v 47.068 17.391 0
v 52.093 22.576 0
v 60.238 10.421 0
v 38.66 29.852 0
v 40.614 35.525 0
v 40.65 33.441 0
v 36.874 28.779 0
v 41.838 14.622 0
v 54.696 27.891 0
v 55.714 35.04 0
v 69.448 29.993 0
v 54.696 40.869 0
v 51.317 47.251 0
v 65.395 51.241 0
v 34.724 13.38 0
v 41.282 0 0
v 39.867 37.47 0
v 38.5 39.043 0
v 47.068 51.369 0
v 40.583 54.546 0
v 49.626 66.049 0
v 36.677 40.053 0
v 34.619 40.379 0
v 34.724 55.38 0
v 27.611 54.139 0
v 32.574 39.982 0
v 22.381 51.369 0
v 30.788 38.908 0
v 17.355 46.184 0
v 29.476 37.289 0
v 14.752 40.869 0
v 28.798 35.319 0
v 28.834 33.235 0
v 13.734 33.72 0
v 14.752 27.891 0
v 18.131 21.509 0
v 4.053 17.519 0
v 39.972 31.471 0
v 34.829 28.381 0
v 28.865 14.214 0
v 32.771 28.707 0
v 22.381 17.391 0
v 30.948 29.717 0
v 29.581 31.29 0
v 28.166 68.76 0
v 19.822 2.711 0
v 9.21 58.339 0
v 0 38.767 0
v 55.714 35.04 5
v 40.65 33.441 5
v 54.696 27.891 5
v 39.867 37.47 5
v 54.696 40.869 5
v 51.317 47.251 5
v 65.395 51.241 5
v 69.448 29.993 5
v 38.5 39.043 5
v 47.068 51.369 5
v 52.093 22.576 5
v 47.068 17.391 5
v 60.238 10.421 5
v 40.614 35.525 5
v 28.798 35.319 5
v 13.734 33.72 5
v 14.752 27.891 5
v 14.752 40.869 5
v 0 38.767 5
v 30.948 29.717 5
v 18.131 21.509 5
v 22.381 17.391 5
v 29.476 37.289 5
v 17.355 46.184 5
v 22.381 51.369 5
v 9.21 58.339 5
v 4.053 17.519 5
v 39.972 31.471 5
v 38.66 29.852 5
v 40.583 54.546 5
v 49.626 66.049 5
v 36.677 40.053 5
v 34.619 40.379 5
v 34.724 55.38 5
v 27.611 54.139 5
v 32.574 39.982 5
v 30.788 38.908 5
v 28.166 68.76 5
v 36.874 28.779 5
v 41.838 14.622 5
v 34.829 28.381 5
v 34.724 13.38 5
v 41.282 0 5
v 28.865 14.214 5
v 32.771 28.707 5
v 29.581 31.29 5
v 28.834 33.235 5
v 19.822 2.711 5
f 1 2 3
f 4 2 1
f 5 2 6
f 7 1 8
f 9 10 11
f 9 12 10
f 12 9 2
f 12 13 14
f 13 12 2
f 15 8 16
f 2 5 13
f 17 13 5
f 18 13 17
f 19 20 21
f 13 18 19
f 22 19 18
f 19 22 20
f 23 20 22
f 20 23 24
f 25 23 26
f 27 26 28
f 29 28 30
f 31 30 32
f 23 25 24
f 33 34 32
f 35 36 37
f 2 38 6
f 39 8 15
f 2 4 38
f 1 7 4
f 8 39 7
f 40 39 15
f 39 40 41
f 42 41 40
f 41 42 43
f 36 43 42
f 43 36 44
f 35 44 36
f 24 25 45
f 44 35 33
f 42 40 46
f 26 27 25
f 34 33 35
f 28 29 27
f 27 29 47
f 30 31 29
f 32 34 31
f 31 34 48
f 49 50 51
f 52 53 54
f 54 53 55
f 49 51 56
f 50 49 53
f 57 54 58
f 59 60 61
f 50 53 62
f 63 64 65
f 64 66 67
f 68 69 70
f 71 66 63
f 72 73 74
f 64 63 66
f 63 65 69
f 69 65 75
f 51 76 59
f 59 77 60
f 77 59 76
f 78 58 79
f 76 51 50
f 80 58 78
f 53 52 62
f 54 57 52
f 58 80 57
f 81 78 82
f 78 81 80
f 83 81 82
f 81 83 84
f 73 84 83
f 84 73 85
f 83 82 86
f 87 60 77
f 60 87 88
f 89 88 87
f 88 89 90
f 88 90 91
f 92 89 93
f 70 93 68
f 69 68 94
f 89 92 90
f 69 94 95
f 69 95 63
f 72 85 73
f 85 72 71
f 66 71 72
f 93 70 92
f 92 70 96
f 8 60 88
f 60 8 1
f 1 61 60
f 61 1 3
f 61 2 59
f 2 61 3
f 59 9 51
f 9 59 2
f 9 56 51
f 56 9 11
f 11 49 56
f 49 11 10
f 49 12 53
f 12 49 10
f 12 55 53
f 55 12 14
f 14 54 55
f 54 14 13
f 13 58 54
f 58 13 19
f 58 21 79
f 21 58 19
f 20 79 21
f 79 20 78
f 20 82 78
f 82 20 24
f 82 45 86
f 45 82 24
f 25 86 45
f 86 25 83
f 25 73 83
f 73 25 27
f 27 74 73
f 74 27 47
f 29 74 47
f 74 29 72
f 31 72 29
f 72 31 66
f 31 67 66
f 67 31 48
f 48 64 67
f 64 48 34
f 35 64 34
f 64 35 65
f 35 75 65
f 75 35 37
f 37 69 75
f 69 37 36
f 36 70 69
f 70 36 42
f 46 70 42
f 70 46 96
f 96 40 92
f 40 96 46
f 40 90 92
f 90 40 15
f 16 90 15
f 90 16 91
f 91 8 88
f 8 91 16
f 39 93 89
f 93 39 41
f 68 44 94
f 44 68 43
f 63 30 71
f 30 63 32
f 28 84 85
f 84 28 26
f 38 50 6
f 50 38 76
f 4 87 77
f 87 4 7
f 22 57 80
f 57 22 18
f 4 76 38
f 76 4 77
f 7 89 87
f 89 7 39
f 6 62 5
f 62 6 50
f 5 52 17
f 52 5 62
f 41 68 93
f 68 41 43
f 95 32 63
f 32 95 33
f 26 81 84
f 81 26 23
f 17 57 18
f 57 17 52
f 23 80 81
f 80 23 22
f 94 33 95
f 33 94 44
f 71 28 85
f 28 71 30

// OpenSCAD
$fn = 32;

// ----------------------------------------------------------------------
// Star wheel: 10-point ratchet, R35
// ----------------------------------------------------------------------

// --- parameters (mm) ---
n_points = 10;            // number of points / teeth
r_out = 35;               // tip radius
r_in = 21;                // root radius
bore_r = 6;               // centre bore radius
plate_t = 5;              // plate thickness, Z (extrusion height)
bore_d = 12;              // centre bore diameter

profile = [[34.724, 55.38], [28.166, 68.76], [27.611, 54.139], [22.381, 51.369], [9.21, 58.339], [17.355, 46.184], [14.752, 40.869], [0, 38.767], [13.734, 33.72], [14.752, 27.891], [4.053, 17.519], [18.131, 21.509], [22.381, 17.391], [19.822, 2.711], [28.865, 14.214], [34.724, 13.38], [41.282, 0], [41.838, 14.622], [47.068, 17.391], [60.238, 10.421], [52.093, 22.576], [54.696, 27.891], [69.448, 29.993], [55.714, 35.04], [54.696, 40.869], [65.395, 51.241], [51.317, 47.251], [47.068, 51.369], [49.626, 66.049], [40.583, 54.546]];  // primary outline, 30 points, counter clockwise
void_1 = [[40.614, 35.525], [39.867, 37.47], [38.5, 39.043], [36.677, 40.053], [34.619, 40.379], [32.574, 39.982], [30.788, 38.908], [29.476, 37.289], [28.798, 35.319], [28.834, 33.235], [29.581, 31.29], [30.948, 29.717], [32.771, 28.707], [34.829, 28.381], [36.874, 28.779], [38.66, 29.852], [39.972, 31.471], [40.65, 33.441]];  // centre bore, 18 points

// --- the one profile operation ---
difference() {
  linear_extrude(height = plate_t) polygon(points = profile);
  translate([0, 0, -1])
    linear_extrude(height = plate_t + 2) polygon(points = void_1);
}
